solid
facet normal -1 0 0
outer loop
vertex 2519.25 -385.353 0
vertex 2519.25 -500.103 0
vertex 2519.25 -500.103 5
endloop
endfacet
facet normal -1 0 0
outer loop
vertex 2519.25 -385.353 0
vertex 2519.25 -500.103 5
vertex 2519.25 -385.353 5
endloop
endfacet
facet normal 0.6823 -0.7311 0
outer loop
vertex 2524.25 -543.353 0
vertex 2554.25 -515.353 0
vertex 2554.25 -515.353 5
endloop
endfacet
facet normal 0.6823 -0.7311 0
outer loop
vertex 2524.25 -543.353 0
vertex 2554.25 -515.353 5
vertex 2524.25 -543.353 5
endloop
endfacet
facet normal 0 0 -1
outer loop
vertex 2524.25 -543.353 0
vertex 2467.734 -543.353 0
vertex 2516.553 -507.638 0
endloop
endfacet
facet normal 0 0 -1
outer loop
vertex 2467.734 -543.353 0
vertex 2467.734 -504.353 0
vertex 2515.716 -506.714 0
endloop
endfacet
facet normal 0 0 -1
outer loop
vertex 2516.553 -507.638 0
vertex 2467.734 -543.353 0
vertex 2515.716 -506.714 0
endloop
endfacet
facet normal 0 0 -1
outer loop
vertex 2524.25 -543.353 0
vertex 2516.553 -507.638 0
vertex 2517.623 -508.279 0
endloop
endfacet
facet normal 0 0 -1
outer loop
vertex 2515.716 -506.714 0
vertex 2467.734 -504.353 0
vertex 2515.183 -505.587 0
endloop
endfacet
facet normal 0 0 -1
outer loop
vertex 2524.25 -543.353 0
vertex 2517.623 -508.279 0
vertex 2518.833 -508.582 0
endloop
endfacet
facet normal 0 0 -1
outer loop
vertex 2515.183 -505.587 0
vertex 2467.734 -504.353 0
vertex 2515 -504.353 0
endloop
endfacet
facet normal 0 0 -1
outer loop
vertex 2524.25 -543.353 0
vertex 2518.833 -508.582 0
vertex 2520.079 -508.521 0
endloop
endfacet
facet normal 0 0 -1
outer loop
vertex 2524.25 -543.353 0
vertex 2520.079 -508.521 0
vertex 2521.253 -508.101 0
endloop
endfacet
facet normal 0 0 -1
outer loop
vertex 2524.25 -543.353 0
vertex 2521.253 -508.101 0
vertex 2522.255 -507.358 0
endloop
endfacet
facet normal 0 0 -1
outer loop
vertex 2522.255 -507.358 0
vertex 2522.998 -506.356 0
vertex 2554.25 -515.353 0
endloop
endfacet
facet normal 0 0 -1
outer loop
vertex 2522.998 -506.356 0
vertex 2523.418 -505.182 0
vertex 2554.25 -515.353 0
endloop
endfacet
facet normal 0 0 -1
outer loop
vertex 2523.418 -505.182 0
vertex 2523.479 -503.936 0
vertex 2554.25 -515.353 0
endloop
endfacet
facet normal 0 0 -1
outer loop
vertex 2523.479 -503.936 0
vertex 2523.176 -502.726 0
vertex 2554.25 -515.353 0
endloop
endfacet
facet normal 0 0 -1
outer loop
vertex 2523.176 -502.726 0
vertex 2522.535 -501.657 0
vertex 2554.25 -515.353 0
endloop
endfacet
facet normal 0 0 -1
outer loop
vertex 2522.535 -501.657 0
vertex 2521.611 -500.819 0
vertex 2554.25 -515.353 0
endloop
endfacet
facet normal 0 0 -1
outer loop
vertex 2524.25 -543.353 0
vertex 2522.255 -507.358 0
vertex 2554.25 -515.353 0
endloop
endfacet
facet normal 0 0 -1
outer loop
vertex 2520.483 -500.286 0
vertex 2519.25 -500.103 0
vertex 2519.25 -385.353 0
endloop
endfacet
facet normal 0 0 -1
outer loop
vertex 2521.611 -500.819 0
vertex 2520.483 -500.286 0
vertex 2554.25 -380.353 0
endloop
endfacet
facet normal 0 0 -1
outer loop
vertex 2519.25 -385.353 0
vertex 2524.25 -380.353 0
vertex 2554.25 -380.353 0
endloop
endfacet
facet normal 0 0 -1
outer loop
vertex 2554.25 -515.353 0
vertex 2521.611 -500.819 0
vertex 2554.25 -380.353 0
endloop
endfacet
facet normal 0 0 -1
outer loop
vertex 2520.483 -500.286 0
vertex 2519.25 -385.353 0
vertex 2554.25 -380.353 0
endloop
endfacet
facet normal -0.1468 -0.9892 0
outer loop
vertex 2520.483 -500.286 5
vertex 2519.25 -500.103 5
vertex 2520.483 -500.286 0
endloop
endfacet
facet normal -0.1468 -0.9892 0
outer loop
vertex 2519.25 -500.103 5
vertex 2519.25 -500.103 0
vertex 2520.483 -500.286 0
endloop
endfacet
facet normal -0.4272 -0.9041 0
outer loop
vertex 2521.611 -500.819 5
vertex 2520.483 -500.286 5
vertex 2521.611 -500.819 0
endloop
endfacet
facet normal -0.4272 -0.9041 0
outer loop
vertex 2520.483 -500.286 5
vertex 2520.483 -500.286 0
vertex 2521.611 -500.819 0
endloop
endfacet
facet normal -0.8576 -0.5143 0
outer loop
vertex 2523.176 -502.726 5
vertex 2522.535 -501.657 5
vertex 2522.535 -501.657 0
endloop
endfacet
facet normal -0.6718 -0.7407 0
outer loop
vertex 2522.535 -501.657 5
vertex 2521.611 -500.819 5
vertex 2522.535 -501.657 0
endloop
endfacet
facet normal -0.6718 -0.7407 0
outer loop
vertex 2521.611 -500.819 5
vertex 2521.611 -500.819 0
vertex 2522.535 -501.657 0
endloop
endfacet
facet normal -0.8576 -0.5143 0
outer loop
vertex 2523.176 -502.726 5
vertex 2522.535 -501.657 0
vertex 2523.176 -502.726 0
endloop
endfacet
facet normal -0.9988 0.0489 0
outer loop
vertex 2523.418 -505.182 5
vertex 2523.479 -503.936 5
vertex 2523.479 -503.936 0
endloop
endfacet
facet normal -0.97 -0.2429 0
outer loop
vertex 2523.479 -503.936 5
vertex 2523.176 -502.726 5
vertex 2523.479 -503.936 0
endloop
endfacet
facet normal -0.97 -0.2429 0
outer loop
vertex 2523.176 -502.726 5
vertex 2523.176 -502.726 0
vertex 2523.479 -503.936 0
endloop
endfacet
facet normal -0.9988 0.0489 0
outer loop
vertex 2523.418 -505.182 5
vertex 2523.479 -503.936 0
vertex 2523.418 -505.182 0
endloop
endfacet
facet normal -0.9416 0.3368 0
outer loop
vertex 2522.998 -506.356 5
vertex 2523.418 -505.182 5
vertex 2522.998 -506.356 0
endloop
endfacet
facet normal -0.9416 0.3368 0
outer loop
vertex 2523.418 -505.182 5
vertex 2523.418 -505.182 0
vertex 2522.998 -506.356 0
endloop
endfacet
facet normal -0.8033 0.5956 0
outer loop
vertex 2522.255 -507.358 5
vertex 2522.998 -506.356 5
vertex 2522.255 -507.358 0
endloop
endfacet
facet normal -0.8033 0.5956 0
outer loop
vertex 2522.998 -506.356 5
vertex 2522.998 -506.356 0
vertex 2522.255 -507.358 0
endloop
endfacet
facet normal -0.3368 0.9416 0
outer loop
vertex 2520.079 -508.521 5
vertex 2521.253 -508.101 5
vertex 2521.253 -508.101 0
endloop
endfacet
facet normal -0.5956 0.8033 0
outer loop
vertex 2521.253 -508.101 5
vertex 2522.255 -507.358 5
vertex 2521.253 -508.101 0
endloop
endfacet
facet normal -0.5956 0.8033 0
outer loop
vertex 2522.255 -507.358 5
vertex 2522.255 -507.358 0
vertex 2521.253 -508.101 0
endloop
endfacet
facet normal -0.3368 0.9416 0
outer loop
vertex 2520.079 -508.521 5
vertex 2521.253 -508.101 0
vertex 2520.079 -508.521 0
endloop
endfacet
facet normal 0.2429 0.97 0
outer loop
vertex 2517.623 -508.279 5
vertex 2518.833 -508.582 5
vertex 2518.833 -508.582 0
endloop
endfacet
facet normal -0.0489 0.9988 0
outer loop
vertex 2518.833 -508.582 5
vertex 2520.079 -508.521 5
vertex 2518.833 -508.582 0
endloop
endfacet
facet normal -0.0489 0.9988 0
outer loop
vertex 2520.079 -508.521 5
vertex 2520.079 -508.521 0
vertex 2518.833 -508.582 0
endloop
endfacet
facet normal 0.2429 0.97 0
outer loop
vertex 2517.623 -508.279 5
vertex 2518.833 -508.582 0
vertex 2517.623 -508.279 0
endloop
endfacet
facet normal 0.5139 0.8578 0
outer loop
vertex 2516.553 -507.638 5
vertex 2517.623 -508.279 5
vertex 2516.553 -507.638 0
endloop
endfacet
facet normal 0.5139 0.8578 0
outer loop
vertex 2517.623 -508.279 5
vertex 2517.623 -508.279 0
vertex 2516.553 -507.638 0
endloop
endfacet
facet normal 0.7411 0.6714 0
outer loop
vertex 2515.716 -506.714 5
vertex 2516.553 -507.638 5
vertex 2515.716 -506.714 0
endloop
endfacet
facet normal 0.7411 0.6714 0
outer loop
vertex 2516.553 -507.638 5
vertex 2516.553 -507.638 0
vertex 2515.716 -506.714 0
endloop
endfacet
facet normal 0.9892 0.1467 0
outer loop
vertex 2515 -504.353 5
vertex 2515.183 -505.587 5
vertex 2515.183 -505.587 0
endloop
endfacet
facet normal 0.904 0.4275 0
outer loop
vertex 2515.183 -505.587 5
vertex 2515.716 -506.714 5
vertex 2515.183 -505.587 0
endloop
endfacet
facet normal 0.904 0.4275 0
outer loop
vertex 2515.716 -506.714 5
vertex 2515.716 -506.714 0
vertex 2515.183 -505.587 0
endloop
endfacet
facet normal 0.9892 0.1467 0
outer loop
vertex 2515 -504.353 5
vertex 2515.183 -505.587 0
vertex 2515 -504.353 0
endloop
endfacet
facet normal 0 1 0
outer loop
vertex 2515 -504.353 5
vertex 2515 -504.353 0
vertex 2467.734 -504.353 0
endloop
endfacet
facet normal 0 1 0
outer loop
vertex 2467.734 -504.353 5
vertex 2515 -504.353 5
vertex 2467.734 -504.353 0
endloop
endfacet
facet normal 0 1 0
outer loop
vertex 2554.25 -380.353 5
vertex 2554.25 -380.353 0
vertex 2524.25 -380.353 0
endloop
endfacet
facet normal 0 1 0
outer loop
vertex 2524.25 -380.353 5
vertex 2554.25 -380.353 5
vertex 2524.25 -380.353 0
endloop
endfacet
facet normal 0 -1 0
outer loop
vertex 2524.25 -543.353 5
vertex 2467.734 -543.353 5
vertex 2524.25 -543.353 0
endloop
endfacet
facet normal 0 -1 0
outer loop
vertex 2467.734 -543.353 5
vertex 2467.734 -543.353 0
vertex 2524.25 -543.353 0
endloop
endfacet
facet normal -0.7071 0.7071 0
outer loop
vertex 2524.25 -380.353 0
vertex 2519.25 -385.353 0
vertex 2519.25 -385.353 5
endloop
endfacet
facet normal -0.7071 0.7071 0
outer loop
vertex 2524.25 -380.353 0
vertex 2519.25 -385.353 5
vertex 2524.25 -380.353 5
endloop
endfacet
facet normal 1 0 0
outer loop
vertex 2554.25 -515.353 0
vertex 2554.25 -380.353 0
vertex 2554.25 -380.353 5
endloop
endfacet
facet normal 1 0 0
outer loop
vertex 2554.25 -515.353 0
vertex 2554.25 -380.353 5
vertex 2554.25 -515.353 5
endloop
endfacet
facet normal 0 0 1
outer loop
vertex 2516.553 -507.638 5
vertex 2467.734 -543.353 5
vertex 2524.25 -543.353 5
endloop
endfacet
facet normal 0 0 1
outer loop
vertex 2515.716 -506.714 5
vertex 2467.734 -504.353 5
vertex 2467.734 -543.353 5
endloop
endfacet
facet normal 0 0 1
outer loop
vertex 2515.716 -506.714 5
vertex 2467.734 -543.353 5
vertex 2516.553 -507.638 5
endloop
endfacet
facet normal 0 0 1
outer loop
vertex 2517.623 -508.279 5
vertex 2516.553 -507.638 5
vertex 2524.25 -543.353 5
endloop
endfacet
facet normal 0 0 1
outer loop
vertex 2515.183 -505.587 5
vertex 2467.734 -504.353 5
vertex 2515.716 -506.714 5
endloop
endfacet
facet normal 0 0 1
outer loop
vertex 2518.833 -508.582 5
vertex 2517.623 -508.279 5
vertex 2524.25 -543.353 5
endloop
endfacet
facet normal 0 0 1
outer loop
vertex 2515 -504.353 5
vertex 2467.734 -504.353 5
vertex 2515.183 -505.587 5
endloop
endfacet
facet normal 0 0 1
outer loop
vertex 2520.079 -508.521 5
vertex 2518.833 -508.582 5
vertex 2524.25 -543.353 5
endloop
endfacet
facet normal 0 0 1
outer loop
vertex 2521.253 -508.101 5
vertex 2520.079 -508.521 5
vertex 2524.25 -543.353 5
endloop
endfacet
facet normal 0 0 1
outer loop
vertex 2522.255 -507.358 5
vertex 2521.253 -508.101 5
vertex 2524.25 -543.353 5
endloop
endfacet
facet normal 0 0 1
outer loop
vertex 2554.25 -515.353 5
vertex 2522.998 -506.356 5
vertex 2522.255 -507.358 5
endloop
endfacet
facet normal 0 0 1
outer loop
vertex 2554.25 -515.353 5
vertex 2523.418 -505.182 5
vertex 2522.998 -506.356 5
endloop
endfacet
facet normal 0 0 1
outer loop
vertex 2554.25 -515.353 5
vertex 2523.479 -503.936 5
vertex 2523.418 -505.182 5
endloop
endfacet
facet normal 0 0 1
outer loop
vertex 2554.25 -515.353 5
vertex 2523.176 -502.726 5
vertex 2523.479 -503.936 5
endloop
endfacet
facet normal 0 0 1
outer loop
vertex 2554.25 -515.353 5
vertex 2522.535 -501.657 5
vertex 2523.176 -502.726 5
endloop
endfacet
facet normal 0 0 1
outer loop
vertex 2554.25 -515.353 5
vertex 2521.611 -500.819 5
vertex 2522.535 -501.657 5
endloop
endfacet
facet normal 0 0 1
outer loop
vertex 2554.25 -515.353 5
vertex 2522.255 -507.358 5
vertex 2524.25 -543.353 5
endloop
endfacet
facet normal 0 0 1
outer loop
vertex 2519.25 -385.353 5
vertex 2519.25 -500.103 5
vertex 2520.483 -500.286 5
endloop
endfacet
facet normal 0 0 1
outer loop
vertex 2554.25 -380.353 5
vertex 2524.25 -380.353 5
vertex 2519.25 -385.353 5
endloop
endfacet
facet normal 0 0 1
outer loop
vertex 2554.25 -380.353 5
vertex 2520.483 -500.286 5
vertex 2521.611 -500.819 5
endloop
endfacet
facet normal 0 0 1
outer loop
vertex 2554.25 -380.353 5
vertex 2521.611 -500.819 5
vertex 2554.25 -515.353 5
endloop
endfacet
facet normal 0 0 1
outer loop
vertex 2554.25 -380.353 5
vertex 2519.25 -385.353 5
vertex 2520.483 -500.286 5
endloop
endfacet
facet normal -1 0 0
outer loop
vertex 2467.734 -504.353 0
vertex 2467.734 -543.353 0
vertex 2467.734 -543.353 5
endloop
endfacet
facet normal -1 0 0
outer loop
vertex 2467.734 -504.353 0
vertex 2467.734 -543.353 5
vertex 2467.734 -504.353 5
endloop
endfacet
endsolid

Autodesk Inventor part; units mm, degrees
ref_plane "YZ Plane" through (0, 0, 0) normal (1, 0, 0) x (0, 1, 0)
ref_plane "XZ Plane" through (0, 0, 0) normal (0, 1, 0) x (-1, 0, 0)
ref_plane "XY Plane" through (0, 0, 0) normal (0, 0, 1) x (1, 0, 0)
sketch "Sketch1" plane through (0, 0, 0) normal (0, 0, 1) x (1, 0, 0)
  line L0 (2519.2496, -500.1029) -> (2519.2496, -385.3529)
  line L1 (2554.2496, -380.3529) -> (2524.2496, -380.3529)
  line L2 (2554.2496, -380.3529) -> (2554.2496, -515.3529)
  line L3 (2467.7344, -543.3529) -> (2524.2496, -543.3529)
  line L4 (2554.2496, -515.3529) -> (2524.2496, -543.3529)
  line L5 (2514.9996, -504.3529) -> (2467.7344, -504.3529)
  line L6 (2467.7344, -543.3529) -> (2467.7344, -504.3529)
  line L7 (2521.7496, -380.3529) -> (2519.2496, -384.3529)
  arc A0 (2514.9996, -504.3529) -> (2519.2496, -500.1029) centre (2519.2496, -504.3529) ccw
  line L8 (2519.2496, -385.3529) -> (2524.2496, -380.3529)
  point P0 (0, 0)
  point P1 (2519.2496, -380.3529)
  dimension "d1" = 35
  dimension "d3" = 135
  dimension "d5" = 163
  dimension "d7" = 51.5152
  dimension "d9" = 39
  dimension "d11" = 56.5152
  dimension "d13" = 8.5
  dimension "d16" = 5
  dimension "d17" = 5
extrude "Extrusion1" add sketch "Sketch1" along normal blind 5
equation "\"d17\" = d16"
properties part number "ADSK-MH-10038" material "Steel, Mild"
